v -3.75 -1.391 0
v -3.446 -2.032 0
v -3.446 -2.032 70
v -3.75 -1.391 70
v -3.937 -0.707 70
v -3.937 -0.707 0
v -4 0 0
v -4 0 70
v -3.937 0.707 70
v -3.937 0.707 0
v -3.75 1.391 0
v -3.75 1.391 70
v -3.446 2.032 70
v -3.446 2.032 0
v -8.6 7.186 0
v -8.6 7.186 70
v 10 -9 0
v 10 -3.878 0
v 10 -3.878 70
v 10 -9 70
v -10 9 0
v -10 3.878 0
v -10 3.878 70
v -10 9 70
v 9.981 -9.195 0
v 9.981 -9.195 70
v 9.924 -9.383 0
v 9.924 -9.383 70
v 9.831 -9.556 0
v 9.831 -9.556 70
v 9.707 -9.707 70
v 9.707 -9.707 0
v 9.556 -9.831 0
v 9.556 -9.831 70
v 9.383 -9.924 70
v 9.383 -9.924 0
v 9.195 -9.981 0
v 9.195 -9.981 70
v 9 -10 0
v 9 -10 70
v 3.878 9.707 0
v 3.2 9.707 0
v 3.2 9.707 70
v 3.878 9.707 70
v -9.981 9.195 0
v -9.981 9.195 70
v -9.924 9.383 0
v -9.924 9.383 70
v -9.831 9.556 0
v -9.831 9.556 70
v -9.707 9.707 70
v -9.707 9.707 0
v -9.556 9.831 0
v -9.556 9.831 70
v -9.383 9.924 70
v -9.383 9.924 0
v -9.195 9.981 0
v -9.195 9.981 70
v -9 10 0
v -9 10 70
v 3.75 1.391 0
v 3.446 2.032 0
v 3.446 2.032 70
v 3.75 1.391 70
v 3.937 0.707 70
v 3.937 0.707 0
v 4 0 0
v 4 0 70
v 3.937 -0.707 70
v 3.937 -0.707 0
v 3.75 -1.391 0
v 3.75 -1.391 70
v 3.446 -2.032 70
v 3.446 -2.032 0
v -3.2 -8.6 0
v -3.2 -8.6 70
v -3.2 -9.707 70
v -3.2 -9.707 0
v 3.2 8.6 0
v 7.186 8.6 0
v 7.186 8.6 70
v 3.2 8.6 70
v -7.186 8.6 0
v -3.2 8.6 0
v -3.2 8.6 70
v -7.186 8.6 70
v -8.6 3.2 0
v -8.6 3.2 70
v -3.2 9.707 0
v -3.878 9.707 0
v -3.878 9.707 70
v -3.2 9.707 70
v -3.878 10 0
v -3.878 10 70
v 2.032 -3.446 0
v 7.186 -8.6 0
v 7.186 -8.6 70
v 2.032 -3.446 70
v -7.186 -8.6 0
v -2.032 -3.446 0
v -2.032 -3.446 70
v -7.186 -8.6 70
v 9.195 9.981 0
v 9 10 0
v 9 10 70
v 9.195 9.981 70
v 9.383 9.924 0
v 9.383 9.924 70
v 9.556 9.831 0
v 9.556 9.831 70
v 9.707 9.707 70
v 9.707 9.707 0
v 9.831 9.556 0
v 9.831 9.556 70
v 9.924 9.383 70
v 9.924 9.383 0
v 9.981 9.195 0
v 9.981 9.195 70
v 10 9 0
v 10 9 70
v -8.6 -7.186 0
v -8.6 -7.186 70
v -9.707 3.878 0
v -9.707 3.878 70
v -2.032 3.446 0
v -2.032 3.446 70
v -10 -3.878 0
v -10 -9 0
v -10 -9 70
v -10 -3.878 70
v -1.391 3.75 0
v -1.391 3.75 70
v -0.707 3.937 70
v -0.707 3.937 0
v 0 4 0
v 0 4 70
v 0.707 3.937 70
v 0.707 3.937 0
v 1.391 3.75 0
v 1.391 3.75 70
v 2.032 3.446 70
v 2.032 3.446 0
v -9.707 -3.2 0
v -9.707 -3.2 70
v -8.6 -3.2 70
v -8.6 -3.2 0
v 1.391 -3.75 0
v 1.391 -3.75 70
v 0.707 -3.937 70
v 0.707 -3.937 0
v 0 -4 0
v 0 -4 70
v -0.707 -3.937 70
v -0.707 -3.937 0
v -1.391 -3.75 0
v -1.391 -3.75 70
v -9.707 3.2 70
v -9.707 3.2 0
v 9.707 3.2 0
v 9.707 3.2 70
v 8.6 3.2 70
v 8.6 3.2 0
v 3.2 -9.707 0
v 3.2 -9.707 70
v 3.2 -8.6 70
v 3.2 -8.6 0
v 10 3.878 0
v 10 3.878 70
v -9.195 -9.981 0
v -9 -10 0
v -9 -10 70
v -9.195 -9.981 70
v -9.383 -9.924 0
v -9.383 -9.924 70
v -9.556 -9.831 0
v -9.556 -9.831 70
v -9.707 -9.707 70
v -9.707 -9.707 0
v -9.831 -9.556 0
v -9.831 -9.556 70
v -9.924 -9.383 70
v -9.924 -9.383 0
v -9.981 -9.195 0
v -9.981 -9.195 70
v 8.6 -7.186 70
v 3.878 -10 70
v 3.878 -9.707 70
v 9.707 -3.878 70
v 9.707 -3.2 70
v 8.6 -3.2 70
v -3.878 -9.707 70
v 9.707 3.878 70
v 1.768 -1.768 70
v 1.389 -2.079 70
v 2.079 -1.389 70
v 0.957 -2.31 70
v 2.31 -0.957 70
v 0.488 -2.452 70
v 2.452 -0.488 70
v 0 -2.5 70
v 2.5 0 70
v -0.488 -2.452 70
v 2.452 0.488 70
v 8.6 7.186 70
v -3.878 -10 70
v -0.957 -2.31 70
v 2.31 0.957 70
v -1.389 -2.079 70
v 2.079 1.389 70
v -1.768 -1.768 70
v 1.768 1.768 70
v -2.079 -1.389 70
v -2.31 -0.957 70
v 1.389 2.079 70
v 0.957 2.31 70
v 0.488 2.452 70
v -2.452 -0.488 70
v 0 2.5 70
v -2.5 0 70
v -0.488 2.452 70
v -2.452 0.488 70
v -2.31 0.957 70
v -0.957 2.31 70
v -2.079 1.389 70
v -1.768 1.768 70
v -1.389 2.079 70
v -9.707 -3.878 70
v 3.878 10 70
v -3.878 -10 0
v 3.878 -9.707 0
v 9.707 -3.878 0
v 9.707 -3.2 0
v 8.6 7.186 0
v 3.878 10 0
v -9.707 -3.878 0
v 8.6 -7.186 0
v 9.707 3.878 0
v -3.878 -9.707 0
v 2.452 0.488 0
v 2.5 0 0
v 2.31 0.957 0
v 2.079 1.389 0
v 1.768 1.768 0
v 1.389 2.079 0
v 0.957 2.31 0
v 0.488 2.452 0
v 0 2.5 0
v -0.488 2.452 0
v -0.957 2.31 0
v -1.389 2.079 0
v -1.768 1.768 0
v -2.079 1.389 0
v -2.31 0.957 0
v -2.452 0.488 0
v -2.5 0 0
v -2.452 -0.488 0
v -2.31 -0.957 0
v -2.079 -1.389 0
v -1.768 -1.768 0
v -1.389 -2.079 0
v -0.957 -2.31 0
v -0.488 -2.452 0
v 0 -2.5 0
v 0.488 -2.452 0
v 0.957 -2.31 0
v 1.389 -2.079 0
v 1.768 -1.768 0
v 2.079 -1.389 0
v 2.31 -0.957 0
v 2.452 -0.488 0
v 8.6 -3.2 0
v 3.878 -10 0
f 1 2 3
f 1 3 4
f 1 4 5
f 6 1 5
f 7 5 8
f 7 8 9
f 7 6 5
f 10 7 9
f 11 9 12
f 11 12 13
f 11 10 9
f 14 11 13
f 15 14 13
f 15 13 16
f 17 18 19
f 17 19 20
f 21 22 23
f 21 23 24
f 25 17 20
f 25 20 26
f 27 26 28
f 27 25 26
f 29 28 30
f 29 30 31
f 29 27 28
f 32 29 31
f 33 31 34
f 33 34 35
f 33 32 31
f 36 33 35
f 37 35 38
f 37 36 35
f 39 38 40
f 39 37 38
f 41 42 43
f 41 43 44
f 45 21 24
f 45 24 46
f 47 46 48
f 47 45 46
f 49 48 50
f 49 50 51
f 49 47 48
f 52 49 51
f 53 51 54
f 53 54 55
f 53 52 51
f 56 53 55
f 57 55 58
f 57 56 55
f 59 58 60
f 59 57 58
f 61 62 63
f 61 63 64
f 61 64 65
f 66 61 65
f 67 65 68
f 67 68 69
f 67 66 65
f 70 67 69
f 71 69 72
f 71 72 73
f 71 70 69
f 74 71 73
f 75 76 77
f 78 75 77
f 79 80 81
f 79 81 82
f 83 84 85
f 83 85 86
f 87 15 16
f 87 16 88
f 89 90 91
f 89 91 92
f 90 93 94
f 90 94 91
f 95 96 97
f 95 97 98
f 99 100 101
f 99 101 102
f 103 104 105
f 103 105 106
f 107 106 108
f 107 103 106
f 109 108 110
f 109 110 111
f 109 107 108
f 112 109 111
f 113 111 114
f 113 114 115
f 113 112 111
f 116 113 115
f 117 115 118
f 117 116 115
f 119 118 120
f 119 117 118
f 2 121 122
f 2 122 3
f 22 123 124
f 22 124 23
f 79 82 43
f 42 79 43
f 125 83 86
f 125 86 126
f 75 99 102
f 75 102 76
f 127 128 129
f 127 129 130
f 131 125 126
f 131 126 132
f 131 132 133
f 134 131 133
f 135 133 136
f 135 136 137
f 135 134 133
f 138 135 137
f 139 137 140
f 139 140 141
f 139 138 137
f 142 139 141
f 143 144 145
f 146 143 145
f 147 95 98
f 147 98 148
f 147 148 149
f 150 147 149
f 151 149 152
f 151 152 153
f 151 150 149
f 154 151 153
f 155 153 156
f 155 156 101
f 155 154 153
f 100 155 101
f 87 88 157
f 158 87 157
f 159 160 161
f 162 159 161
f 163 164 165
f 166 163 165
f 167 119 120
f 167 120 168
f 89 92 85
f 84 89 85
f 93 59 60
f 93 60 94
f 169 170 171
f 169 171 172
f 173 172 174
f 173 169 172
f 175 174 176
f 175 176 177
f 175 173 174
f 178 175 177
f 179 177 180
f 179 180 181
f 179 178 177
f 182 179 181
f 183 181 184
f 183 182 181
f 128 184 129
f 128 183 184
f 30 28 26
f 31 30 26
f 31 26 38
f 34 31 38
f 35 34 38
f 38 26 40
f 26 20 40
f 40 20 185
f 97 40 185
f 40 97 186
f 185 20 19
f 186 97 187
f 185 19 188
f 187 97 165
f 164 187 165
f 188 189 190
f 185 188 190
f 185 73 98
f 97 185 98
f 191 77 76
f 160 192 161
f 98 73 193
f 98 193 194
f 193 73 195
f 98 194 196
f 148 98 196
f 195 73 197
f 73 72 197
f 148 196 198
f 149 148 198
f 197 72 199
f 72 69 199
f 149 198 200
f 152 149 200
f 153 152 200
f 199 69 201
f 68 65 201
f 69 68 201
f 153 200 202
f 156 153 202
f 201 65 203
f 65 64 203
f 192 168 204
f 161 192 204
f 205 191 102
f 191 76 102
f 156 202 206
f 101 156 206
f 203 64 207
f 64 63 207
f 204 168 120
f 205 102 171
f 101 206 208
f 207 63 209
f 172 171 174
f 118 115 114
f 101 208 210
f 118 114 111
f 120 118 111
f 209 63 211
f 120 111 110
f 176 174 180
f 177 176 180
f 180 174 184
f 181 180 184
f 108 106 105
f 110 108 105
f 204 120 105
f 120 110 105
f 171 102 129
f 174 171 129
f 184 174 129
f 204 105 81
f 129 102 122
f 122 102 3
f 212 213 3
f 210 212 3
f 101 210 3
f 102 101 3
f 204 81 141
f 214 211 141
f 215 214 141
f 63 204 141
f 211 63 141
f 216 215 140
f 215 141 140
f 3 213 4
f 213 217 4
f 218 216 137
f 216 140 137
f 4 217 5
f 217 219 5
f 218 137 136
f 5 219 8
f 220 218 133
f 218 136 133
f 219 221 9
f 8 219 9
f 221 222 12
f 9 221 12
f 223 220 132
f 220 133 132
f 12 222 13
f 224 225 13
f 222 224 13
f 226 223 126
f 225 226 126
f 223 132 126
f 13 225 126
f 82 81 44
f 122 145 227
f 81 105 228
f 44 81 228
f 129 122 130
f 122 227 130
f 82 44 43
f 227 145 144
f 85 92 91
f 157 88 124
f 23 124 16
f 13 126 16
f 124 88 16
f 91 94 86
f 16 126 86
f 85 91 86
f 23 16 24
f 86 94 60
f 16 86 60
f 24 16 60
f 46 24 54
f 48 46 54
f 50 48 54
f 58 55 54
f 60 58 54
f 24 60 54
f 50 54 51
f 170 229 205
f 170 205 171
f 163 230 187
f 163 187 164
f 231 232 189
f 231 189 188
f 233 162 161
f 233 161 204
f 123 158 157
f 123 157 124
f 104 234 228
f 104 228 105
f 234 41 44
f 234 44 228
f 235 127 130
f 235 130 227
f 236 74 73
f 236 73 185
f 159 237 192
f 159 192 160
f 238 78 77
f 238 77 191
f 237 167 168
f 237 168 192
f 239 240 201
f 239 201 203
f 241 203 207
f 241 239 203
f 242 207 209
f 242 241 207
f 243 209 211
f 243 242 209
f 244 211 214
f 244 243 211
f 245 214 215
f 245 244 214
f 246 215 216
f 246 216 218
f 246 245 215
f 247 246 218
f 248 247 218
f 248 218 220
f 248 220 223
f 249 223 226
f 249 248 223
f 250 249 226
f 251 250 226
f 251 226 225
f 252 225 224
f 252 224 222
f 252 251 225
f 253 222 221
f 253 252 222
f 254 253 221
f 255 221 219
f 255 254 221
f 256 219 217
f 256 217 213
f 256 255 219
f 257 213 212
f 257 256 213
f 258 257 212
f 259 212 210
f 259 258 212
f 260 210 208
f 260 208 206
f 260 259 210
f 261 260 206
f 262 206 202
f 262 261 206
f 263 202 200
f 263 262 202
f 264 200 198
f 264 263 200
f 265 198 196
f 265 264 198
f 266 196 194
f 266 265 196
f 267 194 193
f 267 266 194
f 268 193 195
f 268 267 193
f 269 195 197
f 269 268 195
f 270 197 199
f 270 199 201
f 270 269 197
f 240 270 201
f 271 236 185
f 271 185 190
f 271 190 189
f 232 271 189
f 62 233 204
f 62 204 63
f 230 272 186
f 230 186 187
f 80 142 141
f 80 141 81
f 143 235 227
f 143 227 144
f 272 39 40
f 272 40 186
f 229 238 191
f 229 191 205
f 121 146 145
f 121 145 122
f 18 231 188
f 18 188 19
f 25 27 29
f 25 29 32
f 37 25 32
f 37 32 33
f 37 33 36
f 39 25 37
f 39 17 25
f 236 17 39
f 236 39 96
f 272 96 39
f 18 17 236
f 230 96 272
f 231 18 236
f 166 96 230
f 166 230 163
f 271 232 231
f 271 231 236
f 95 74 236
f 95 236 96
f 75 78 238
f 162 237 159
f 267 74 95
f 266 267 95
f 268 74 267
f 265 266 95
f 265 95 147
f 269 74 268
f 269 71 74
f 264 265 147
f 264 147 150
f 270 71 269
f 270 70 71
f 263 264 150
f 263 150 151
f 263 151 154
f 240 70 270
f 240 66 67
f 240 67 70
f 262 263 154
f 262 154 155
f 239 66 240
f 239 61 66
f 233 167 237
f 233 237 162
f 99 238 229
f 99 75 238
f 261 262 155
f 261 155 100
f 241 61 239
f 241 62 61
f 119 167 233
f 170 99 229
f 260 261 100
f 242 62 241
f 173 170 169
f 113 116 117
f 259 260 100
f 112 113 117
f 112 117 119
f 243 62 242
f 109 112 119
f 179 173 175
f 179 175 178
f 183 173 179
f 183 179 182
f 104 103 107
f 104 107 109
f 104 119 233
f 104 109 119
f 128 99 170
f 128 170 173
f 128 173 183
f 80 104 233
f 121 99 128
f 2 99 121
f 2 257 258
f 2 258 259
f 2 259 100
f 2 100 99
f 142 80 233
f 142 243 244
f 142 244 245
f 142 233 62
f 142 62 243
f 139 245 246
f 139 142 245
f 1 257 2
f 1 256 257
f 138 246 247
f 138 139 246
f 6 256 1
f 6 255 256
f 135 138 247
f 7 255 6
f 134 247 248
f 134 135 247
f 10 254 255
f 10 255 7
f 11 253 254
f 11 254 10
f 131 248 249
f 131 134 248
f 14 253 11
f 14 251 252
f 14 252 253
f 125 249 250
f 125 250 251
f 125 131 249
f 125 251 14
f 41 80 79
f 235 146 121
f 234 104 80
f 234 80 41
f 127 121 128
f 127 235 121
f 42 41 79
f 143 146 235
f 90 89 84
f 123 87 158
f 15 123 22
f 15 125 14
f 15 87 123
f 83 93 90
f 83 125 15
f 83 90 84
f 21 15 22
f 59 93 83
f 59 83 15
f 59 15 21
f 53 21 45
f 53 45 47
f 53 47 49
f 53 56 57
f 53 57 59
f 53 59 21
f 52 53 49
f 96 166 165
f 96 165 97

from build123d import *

# Parameters (mm, degrees)
SKETCH1_R           = 2.5
BOSS_EXTRUDE1_DEPTH = 70


with BuildPart() as part:
    # Sketch1 → Boss-Extrude1 (new body)
    with BuildSketch(Plane.XY):
        with BuildLine():
            Line((-9.707106781, -3.2), (-8.6, -3.2))
            Line((-8.6, -3.2), (-8.6, -7.185786438))
            Line((-8.6, -7.185786438), (-3.445719569, -2.031506006))
            ThreePointArc((-3.445719569, -2.031506006), (-4, 0), (-3.445719569, 2.031506006))
            Line((-3.445719569, 2.031506006), (-8.6, 7.185786438))
            Line((-8.6, 7.185786438), (-8.6, 3.2))
            Line((-8.6, 3.2), (-9.707106781, 3.2))
            Line((-9.707106781, 3.2), (-9.707106781, 3.877544562))
            Line((-9.707106781, 3.877544562), (-10, 3.877544562))
            Line((-10, 3.877544562), (-10, 9))
            ThreePointArc((-10, 9), (-9.707106781, 9.707106781), (-9, 10))
            Line((-9, 10), (-3.877544562, 10))
            Line((-3.877544562, 10), (-3.877544562, 9.707106781))
            Line((-3.877544562, 9.707106781), (-3.2, 9.707106781))
            Line((-3.2, 9.707106781), (-3.2, 8.6))
            Line((-3.2, 8.6), (-7.185786438, 8.6))
            Line((-7.185786438, 8.6), (-2.031506006, 3.445719569))
            ThreePointArc((-2.031506006, 3.445719569), (0, 4), (2.031506006, 3.445719569))
            Line((2.031506006, 3.445719569), (7.185786438, 8.6))
            Line((7.185786438, 8.6), (3.2, 8.6))
            Line((3.2, 8.6), (3.2, 9.707106781))
            Line((3.2, 9.707106781), (3.877544562, 9.707106781))
            Line((3.877544562, 9.707106781), (3.877544562, 10))
            Line((3.877544562, 10), (9, 10))
            ThreePointArc((9, 10), (9.707106781, 9.707106781), (10, 9))
            Line((10, 9), (10, 3.877544562))
            Line((10, 3.877544562), (9.707106781, 3.877544562))
            Line((9.707106781, 3.877544562), (9.707106781, 3.2))
            Line((9.707106781, 3.2), (8.6, 3.2))
            Line((8.6, 3.2), (8.6, 7.185786438))
            Line((8.6, 7.185786438), (3.445719569, 2.031506006))
            ThreePointArc((3.445719569, 2.031506006), (4, 0), (3.445719569, -2.031506006))
            Line((3.445719569, -2.031506006), (8.6, -7.185786438))
            Line((8.6, -7.185786438), (8.6, -3.2))
            Line((8.6, -3.2), (9.707106781, -3.2))
            Line((9.707106781, -3.2), (9.707106781, -3.877544562))
            Line((9.707106781, -3.877544562), (10, -3.877544562))
            Line((10, -3.877544562), (10, -9))
            ThreePointArc((10, -9), (9.707106781, -9.707106781), (9, -10))
            Line((9, -10), (3.877544562, -10))
            Line((3.877544562, -10), (3.877544562, -9.707106781))
            Line((3.877544562, -9.707106781), (3.2, -9.707106781))
            Line((3.2, -9.707106781), (3.2, -8.6))
            Line((3.2, -8.6), (7.185786438, -8.6))
            Line((7.185786438, -8.6), (2.031506006, -3.445719569))
            ThreePointArc((2.031506006, -3.445719569), (0, -4), (-2.031506006, -3.445719569))
            Line((-2.031506006, -3.445719569), (-7.185786438, -8.6))
            Line((-7.185786438, -8.6), (-3.2, -8.6))
            Line((-3.2, -8.6), (-3.2, -9.707106781))
            Line((-3.2, -9.707106781), (-3.877544562, -9.707106781))
            Line((-3.877544562, -9.707106781), (-3.877544562, -10))
            Line((-3.877544562, -10), (-9, -10))
            ThreePointArc((-9, -10), (-9.707106781, -9.707106781), (-10, -9))
            Line((-10, -9), (-10, -3.877544562))
            Line((-10, -3.877544562), (-9.707106781, -3.877544562))
            Line((-9.707106781, -3.877544562), (-9.707106781, -3.2))
        make_face()
        Circle(SKETCH1_R, mode=Mode.SUBTRACT)
    extrude(amount=BOSS_EXTRUDE1_DEPTH)


solid = part.part
